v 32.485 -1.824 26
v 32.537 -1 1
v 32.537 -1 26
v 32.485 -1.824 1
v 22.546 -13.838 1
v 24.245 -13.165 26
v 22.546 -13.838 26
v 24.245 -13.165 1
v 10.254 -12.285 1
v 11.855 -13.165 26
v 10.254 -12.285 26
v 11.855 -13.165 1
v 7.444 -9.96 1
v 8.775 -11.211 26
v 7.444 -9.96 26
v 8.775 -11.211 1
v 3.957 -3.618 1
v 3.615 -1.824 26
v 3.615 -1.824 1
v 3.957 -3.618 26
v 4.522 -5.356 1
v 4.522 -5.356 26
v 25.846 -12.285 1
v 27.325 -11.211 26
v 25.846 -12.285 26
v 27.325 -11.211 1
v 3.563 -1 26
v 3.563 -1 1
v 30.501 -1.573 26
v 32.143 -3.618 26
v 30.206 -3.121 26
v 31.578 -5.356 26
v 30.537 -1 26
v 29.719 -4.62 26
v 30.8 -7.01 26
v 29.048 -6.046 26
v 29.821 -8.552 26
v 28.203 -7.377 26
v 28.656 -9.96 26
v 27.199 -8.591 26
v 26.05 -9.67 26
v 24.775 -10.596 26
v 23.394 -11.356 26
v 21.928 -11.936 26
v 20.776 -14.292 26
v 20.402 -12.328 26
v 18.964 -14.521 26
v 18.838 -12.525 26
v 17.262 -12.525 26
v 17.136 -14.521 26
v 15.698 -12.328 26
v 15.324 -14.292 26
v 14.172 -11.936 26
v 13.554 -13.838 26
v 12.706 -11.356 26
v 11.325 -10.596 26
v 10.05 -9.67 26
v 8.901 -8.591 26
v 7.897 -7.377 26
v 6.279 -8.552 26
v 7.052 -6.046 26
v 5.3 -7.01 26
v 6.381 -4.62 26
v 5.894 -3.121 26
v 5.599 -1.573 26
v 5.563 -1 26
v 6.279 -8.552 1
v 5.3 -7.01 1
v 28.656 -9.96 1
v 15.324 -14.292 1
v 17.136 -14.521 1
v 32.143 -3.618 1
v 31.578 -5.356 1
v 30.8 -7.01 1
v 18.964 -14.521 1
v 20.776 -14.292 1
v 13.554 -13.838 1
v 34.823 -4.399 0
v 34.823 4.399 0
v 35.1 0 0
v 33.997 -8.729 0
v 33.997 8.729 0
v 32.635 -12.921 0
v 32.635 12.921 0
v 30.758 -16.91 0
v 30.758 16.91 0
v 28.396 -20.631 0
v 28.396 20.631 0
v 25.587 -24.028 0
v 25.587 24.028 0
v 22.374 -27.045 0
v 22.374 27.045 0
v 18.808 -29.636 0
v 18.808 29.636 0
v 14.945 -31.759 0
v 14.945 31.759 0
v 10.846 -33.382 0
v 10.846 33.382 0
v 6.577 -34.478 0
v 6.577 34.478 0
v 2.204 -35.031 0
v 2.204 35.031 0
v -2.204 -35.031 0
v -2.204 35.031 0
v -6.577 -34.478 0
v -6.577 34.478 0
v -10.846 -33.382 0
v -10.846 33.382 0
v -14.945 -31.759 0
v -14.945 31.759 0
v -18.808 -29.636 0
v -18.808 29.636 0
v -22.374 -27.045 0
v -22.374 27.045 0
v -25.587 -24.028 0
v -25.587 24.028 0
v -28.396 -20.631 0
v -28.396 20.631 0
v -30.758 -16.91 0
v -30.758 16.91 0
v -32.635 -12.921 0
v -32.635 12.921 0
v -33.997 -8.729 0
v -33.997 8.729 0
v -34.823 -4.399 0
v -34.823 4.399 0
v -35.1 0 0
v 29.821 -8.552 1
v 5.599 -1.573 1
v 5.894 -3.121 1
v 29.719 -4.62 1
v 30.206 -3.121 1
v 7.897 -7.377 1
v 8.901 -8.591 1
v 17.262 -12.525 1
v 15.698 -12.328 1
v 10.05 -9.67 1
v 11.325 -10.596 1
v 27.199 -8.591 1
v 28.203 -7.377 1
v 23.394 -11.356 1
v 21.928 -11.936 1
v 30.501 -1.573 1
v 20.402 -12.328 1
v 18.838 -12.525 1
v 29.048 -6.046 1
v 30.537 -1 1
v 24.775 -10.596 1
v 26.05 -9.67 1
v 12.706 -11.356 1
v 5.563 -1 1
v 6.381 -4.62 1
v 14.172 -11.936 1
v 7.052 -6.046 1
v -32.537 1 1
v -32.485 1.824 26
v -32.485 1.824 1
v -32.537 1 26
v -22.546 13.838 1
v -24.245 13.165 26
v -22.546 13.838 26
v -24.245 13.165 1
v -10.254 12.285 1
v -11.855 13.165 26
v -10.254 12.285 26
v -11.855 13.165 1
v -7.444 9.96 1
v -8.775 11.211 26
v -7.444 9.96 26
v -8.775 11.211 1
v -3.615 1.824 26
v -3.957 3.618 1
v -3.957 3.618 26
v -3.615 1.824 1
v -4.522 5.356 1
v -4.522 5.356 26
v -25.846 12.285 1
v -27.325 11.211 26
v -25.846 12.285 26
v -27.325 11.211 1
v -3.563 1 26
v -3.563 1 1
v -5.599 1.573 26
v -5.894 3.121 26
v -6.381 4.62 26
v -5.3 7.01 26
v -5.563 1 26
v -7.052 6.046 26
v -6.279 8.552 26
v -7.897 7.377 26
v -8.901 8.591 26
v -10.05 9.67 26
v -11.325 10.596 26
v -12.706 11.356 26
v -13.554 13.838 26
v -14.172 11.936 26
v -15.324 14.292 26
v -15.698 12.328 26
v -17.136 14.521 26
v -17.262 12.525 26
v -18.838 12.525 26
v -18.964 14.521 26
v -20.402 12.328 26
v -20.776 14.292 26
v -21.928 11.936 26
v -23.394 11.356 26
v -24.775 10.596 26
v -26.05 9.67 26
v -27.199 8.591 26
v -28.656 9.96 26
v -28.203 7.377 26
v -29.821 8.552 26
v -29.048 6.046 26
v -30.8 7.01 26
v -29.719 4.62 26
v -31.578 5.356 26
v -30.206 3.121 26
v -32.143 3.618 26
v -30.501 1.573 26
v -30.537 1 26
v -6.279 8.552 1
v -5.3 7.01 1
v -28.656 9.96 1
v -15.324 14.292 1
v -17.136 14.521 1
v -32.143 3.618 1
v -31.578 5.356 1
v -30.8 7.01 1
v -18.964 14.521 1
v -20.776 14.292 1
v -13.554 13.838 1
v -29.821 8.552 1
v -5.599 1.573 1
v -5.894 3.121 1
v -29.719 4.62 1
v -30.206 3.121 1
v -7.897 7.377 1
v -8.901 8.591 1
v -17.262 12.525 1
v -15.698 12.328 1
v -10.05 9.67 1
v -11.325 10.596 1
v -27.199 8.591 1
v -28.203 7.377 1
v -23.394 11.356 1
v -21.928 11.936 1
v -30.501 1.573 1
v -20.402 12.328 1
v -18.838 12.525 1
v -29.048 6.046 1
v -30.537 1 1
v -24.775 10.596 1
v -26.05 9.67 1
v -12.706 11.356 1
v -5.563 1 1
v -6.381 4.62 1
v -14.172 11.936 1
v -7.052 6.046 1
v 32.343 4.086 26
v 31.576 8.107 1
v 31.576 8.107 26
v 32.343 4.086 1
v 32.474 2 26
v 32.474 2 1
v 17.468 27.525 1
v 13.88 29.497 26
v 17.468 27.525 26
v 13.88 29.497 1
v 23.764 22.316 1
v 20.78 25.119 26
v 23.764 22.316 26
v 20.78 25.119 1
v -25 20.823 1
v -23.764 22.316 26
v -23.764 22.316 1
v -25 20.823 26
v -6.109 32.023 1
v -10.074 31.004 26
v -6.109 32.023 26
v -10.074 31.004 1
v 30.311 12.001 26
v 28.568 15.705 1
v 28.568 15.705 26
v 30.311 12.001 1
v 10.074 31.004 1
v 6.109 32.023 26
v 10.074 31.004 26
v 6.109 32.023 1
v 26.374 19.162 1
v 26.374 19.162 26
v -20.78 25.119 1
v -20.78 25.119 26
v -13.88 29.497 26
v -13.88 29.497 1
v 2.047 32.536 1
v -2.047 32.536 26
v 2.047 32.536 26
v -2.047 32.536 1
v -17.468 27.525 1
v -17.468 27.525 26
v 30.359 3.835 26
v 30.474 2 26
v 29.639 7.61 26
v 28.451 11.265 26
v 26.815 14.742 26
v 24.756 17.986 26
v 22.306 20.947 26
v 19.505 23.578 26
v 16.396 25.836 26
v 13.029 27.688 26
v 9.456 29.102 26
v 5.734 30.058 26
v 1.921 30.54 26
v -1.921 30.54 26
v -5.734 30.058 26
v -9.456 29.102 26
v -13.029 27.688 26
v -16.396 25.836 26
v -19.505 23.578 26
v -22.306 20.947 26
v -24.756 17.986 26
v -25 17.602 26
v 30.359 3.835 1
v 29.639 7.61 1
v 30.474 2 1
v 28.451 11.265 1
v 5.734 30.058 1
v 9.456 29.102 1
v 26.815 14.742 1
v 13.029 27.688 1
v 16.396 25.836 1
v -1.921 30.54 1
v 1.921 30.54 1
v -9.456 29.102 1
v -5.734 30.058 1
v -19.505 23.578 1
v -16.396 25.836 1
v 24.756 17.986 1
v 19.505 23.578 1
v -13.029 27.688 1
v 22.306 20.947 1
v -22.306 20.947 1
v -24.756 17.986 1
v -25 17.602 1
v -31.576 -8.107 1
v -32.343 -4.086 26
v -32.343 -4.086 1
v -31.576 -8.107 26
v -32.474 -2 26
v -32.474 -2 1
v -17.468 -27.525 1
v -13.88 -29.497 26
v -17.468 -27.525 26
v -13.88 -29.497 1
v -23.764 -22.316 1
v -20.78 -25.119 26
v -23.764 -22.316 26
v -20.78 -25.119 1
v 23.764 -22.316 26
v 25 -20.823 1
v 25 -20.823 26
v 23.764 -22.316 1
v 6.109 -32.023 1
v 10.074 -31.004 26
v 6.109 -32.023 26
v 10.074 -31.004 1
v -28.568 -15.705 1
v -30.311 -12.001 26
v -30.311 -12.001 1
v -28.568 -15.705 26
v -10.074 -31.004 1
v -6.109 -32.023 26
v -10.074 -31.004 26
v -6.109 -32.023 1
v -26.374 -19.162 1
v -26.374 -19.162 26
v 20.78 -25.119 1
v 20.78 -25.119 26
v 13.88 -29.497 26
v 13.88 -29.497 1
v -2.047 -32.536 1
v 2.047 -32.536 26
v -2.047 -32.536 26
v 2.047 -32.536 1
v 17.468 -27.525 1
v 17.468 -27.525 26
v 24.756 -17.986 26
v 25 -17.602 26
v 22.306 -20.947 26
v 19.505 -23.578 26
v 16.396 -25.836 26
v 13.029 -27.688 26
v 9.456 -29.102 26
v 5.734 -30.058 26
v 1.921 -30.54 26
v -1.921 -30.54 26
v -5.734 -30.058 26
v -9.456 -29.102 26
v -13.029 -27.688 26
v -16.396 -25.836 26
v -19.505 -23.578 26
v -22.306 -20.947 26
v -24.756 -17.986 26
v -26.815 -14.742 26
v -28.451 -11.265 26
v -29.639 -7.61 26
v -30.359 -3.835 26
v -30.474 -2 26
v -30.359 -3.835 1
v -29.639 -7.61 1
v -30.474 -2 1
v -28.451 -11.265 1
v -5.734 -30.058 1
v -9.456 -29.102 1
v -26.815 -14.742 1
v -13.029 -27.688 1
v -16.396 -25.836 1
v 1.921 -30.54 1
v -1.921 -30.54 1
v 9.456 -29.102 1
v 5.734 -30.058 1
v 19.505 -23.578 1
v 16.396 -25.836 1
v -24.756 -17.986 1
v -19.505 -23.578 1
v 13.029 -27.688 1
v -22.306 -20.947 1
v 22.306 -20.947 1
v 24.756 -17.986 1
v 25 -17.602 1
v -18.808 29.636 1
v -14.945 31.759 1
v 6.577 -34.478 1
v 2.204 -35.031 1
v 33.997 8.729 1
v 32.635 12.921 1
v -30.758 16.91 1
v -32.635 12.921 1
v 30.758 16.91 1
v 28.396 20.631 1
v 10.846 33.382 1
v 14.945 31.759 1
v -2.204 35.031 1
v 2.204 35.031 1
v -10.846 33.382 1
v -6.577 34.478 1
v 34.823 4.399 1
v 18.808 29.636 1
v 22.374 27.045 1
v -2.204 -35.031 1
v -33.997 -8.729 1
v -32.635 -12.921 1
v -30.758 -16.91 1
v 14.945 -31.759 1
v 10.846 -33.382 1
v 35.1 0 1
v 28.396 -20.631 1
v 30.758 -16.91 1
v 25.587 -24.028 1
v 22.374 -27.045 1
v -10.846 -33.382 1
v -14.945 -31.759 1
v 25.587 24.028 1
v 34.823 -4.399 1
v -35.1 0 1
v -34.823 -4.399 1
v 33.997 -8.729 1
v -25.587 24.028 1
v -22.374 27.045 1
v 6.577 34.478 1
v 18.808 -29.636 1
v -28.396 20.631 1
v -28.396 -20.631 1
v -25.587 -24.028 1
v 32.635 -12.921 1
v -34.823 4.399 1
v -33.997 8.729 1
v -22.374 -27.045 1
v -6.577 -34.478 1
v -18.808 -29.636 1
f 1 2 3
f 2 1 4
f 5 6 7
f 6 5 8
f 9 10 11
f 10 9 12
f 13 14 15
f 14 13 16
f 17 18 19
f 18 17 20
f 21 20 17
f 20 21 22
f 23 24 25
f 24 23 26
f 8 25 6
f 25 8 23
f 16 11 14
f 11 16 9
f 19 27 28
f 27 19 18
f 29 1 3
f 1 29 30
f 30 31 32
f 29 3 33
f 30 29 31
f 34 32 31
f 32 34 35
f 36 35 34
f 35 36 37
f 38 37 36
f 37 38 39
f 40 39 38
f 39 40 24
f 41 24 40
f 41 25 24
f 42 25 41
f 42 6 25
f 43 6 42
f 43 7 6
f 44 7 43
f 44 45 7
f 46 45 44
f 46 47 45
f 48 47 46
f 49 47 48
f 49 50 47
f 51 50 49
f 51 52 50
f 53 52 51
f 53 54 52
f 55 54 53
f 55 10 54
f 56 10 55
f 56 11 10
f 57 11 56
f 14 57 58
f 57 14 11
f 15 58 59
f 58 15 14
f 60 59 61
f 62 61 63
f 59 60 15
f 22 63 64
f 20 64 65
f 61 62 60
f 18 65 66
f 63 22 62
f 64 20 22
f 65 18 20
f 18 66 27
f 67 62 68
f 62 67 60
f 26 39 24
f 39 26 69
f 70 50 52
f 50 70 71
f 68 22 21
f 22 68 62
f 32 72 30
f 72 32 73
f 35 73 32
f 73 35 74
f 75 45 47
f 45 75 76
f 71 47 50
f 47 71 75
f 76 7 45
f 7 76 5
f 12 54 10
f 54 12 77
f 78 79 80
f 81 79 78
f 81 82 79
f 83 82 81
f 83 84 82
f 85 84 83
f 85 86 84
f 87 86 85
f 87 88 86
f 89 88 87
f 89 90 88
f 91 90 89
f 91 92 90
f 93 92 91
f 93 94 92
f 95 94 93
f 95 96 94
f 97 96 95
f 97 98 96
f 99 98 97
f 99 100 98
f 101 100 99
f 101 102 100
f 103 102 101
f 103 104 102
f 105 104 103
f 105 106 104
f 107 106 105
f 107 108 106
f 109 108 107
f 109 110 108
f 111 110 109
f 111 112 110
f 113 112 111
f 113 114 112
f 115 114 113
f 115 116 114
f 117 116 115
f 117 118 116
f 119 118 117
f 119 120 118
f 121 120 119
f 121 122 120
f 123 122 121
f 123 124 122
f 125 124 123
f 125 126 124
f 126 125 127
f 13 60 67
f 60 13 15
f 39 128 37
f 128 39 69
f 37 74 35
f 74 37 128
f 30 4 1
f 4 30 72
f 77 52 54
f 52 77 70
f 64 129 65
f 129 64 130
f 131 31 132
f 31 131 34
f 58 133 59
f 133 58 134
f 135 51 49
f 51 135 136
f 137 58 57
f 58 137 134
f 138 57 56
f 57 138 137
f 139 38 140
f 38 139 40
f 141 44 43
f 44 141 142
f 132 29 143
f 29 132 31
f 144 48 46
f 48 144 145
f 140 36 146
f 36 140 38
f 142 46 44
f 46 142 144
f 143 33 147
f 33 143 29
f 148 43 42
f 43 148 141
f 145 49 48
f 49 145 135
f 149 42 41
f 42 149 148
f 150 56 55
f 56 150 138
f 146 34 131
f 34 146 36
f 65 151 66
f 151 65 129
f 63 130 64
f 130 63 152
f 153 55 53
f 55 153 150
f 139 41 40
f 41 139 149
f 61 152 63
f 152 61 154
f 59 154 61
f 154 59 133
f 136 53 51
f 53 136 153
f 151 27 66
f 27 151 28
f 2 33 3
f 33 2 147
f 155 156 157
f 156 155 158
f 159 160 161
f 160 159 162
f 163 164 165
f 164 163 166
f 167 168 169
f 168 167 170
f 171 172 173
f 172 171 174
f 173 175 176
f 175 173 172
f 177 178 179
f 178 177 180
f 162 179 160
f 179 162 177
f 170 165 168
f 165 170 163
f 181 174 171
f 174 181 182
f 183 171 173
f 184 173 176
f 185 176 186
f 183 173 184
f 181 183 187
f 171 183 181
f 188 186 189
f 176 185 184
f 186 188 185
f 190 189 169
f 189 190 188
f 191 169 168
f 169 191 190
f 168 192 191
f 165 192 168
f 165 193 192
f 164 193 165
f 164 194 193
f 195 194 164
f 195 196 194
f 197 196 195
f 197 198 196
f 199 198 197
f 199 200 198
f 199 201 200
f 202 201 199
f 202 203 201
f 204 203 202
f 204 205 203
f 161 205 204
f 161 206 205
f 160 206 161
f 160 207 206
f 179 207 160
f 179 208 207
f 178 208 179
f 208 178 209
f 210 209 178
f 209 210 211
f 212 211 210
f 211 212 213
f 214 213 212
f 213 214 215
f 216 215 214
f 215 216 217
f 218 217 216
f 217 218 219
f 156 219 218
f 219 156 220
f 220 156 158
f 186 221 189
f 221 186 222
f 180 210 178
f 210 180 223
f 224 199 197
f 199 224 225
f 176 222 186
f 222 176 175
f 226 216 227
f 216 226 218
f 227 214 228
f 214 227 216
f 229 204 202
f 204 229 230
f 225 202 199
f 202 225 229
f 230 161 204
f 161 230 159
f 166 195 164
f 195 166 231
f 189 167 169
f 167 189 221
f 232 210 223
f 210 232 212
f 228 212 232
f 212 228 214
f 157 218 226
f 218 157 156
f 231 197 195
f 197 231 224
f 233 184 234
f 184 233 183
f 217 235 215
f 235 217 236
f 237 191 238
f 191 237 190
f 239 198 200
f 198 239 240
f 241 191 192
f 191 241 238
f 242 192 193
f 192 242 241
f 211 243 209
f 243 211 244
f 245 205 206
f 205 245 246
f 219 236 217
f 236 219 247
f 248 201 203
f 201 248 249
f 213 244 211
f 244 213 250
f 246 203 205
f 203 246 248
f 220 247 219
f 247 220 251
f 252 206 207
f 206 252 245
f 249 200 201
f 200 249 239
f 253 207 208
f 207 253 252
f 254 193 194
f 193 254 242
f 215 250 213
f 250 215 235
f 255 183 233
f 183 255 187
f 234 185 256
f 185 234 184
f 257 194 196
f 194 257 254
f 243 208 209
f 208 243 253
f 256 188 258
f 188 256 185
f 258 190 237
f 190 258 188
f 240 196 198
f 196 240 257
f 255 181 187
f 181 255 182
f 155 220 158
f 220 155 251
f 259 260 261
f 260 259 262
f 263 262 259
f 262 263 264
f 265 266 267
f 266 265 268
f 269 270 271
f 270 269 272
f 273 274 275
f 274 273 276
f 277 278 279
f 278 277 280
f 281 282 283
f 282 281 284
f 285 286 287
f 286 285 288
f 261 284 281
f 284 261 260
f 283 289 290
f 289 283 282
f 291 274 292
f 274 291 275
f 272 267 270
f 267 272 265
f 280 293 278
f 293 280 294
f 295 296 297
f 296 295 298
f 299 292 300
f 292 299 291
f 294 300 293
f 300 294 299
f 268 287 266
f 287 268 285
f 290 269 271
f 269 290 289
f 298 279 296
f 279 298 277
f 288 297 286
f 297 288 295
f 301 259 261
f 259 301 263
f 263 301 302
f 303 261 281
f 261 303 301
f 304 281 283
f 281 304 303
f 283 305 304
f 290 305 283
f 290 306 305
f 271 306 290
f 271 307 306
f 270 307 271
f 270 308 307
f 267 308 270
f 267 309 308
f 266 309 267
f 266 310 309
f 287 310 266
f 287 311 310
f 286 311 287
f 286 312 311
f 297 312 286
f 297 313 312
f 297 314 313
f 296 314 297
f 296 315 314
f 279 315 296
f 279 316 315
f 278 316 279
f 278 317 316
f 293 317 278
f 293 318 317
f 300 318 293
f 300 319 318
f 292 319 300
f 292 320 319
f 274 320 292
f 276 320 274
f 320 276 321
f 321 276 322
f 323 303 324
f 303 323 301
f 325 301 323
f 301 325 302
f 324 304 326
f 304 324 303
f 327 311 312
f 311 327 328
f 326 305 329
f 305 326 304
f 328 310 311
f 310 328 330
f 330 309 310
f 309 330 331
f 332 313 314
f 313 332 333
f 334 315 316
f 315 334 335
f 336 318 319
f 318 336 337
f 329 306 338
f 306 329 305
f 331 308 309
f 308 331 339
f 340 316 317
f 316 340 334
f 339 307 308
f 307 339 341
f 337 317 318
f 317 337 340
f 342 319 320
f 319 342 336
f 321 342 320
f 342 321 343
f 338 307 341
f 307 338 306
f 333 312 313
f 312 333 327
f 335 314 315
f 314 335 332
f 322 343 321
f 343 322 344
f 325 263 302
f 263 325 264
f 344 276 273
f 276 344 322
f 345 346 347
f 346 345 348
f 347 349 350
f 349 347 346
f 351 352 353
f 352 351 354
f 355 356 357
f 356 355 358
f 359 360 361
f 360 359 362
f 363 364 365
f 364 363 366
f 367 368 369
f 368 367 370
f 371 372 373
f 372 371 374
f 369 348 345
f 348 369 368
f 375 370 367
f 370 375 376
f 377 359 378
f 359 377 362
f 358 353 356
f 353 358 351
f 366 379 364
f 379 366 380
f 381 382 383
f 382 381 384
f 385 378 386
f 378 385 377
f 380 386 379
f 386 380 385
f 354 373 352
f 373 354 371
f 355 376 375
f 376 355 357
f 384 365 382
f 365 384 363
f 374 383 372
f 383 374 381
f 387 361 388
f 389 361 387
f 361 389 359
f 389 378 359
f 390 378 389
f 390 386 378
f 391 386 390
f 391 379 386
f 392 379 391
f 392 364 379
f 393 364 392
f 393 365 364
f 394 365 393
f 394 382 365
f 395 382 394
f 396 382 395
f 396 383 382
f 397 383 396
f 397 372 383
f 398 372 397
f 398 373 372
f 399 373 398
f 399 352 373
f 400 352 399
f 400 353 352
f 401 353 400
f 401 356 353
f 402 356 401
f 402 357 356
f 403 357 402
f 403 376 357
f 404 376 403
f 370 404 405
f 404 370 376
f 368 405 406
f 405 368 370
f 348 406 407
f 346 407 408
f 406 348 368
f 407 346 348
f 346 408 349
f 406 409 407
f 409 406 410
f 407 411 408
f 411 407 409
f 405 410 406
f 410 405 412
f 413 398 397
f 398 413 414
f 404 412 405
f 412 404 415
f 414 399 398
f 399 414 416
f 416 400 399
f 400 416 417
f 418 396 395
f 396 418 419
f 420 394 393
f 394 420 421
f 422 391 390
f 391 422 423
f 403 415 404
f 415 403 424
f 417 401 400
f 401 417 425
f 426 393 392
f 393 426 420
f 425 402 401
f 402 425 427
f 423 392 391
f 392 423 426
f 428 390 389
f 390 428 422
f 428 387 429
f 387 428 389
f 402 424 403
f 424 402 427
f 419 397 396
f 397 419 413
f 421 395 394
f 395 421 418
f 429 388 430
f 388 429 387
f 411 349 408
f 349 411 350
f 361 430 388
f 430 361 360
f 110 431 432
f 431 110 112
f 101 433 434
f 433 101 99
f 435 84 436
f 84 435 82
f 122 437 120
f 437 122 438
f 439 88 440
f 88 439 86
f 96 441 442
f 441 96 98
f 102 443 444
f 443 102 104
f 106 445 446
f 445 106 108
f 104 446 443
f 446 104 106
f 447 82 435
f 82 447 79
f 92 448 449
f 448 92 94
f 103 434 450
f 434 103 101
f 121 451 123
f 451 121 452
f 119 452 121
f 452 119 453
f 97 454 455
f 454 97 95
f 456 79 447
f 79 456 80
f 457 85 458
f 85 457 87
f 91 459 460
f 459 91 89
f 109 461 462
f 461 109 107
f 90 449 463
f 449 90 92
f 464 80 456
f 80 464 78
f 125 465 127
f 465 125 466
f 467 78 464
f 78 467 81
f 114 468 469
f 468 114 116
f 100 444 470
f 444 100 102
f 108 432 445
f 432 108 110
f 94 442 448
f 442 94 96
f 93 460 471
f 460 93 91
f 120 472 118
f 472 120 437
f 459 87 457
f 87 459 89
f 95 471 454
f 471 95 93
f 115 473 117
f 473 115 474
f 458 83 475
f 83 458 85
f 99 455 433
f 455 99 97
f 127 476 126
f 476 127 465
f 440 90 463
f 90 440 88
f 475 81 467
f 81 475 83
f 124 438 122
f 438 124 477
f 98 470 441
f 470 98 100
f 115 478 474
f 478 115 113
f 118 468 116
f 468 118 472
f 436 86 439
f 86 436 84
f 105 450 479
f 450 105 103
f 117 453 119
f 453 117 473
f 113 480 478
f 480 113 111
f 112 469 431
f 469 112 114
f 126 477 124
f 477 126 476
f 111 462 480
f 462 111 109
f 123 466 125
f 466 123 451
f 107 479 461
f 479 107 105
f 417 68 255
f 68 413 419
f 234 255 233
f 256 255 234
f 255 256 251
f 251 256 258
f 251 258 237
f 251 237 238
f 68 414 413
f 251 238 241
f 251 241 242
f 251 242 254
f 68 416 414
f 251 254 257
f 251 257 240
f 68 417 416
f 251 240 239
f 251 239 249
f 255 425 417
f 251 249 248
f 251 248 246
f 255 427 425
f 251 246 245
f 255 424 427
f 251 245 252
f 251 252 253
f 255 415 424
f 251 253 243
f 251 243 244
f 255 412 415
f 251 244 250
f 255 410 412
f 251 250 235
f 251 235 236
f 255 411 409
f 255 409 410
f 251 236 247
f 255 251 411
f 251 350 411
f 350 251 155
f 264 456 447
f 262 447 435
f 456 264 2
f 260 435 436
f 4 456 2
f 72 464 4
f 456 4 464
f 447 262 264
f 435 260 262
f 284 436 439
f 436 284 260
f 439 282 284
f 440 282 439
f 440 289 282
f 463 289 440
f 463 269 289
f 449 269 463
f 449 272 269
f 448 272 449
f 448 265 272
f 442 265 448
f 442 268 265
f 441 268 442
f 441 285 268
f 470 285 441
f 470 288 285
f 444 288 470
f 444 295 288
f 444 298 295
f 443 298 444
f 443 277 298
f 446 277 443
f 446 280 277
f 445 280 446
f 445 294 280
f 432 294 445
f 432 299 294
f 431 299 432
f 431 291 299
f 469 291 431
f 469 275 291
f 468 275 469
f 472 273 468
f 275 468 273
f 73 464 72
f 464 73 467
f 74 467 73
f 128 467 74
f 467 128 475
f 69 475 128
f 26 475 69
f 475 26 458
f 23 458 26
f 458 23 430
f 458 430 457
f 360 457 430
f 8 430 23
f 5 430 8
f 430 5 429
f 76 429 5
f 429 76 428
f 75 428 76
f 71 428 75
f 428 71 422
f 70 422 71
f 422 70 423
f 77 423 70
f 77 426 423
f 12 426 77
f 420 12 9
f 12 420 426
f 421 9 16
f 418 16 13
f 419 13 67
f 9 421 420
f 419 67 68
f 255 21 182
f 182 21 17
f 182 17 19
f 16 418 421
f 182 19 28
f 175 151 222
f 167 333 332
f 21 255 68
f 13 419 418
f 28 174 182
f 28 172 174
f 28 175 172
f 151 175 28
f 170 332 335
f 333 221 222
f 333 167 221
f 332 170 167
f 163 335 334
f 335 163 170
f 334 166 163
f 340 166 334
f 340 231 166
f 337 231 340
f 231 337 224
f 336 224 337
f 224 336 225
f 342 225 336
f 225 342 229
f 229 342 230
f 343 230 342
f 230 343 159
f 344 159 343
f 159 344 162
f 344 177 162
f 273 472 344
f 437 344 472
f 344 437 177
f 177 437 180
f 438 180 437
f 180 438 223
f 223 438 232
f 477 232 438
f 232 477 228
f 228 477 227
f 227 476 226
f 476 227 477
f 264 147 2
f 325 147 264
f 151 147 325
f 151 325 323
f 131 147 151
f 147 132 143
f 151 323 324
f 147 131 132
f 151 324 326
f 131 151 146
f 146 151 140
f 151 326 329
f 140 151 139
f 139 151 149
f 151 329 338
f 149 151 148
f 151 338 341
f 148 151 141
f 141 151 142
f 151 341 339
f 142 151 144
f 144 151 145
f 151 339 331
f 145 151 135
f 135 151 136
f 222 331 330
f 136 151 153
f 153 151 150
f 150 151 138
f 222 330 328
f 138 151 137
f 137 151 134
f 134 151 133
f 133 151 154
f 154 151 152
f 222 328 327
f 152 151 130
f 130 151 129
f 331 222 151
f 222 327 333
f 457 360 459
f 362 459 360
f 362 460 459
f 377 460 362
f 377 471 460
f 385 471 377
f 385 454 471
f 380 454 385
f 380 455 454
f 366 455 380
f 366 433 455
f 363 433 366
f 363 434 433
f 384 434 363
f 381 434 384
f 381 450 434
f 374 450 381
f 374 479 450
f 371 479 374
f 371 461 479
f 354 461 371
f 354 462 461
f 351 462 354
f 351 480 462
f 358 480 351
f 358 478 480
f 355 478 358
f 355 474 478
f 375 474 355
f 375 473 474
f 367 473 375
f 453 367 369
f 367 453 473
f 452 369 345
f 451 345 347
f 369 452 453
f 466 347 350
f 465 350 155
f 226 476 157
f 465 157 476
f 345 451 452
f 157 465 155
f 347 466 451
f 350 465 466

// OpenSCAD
// file: lib.scad
inch = 25.4;
OD = 24.5; // od of lager tube
snug_id_small = 19.7;
insert_diameter = 24.25;

module tube(od, id, h){
  difference(){
    color([1, .3, .6])cylinder(d=od, h=h);
    translate([0, 0, -1])cylinder(d=id, h=h + 2);
  }
}
// main file
include <lib.scad>

$fn=50;

ribbon_width = 16.5 + 2;
H = 27;
D = 3 * inch;
thickness = 2;
d = D - 2 * thickness;

floor_h = 1;

module bottom(){
  //color("red")translate([0, 0, -floor_h])
  translate([D, 0, 0])
    difference(){
    cylinder(d=D, h=H);
    translate([0, 0, floor_h])cylinder(d=d, h=H);
    translate([-1, -100, 2 * floor_h])cube([2, 200, ribbon_width + floor_h]);
  }


}

module quartercircle(){
  color("green")
  translate([0, 0, 0])
    difference(){
    cylinder(d=d-2-5, h=H - floor_h);
    cylinder(d=d-2-5 - 2 * thickness, h=H - floor_h + 1);
    translate([-100, -198, -1])cube(200);
    translate([-225, 2, -1])cube(200);
  }
}

module top(){
  module semicircle(){
    color("purple")
      translate([d/4, 0, 0])
      difference(){
      cylinder(d=d/2-2-5, h=H - floor_h);
      translate([0, 0, -1])cylinder(d=d/2-2 * thickness-2-5, h=inch+2);
      translate([-100, -1, -100])cube(200);
    }
  }
  
  cylinder(d=D - 2 * thickness - 2, h=floor_h);
  semicircle();
  rotate([0, 0, 180])semicircle();
  
  quartercircle();
  rotate([0, 0, 180])quartercircle();

}
top();
